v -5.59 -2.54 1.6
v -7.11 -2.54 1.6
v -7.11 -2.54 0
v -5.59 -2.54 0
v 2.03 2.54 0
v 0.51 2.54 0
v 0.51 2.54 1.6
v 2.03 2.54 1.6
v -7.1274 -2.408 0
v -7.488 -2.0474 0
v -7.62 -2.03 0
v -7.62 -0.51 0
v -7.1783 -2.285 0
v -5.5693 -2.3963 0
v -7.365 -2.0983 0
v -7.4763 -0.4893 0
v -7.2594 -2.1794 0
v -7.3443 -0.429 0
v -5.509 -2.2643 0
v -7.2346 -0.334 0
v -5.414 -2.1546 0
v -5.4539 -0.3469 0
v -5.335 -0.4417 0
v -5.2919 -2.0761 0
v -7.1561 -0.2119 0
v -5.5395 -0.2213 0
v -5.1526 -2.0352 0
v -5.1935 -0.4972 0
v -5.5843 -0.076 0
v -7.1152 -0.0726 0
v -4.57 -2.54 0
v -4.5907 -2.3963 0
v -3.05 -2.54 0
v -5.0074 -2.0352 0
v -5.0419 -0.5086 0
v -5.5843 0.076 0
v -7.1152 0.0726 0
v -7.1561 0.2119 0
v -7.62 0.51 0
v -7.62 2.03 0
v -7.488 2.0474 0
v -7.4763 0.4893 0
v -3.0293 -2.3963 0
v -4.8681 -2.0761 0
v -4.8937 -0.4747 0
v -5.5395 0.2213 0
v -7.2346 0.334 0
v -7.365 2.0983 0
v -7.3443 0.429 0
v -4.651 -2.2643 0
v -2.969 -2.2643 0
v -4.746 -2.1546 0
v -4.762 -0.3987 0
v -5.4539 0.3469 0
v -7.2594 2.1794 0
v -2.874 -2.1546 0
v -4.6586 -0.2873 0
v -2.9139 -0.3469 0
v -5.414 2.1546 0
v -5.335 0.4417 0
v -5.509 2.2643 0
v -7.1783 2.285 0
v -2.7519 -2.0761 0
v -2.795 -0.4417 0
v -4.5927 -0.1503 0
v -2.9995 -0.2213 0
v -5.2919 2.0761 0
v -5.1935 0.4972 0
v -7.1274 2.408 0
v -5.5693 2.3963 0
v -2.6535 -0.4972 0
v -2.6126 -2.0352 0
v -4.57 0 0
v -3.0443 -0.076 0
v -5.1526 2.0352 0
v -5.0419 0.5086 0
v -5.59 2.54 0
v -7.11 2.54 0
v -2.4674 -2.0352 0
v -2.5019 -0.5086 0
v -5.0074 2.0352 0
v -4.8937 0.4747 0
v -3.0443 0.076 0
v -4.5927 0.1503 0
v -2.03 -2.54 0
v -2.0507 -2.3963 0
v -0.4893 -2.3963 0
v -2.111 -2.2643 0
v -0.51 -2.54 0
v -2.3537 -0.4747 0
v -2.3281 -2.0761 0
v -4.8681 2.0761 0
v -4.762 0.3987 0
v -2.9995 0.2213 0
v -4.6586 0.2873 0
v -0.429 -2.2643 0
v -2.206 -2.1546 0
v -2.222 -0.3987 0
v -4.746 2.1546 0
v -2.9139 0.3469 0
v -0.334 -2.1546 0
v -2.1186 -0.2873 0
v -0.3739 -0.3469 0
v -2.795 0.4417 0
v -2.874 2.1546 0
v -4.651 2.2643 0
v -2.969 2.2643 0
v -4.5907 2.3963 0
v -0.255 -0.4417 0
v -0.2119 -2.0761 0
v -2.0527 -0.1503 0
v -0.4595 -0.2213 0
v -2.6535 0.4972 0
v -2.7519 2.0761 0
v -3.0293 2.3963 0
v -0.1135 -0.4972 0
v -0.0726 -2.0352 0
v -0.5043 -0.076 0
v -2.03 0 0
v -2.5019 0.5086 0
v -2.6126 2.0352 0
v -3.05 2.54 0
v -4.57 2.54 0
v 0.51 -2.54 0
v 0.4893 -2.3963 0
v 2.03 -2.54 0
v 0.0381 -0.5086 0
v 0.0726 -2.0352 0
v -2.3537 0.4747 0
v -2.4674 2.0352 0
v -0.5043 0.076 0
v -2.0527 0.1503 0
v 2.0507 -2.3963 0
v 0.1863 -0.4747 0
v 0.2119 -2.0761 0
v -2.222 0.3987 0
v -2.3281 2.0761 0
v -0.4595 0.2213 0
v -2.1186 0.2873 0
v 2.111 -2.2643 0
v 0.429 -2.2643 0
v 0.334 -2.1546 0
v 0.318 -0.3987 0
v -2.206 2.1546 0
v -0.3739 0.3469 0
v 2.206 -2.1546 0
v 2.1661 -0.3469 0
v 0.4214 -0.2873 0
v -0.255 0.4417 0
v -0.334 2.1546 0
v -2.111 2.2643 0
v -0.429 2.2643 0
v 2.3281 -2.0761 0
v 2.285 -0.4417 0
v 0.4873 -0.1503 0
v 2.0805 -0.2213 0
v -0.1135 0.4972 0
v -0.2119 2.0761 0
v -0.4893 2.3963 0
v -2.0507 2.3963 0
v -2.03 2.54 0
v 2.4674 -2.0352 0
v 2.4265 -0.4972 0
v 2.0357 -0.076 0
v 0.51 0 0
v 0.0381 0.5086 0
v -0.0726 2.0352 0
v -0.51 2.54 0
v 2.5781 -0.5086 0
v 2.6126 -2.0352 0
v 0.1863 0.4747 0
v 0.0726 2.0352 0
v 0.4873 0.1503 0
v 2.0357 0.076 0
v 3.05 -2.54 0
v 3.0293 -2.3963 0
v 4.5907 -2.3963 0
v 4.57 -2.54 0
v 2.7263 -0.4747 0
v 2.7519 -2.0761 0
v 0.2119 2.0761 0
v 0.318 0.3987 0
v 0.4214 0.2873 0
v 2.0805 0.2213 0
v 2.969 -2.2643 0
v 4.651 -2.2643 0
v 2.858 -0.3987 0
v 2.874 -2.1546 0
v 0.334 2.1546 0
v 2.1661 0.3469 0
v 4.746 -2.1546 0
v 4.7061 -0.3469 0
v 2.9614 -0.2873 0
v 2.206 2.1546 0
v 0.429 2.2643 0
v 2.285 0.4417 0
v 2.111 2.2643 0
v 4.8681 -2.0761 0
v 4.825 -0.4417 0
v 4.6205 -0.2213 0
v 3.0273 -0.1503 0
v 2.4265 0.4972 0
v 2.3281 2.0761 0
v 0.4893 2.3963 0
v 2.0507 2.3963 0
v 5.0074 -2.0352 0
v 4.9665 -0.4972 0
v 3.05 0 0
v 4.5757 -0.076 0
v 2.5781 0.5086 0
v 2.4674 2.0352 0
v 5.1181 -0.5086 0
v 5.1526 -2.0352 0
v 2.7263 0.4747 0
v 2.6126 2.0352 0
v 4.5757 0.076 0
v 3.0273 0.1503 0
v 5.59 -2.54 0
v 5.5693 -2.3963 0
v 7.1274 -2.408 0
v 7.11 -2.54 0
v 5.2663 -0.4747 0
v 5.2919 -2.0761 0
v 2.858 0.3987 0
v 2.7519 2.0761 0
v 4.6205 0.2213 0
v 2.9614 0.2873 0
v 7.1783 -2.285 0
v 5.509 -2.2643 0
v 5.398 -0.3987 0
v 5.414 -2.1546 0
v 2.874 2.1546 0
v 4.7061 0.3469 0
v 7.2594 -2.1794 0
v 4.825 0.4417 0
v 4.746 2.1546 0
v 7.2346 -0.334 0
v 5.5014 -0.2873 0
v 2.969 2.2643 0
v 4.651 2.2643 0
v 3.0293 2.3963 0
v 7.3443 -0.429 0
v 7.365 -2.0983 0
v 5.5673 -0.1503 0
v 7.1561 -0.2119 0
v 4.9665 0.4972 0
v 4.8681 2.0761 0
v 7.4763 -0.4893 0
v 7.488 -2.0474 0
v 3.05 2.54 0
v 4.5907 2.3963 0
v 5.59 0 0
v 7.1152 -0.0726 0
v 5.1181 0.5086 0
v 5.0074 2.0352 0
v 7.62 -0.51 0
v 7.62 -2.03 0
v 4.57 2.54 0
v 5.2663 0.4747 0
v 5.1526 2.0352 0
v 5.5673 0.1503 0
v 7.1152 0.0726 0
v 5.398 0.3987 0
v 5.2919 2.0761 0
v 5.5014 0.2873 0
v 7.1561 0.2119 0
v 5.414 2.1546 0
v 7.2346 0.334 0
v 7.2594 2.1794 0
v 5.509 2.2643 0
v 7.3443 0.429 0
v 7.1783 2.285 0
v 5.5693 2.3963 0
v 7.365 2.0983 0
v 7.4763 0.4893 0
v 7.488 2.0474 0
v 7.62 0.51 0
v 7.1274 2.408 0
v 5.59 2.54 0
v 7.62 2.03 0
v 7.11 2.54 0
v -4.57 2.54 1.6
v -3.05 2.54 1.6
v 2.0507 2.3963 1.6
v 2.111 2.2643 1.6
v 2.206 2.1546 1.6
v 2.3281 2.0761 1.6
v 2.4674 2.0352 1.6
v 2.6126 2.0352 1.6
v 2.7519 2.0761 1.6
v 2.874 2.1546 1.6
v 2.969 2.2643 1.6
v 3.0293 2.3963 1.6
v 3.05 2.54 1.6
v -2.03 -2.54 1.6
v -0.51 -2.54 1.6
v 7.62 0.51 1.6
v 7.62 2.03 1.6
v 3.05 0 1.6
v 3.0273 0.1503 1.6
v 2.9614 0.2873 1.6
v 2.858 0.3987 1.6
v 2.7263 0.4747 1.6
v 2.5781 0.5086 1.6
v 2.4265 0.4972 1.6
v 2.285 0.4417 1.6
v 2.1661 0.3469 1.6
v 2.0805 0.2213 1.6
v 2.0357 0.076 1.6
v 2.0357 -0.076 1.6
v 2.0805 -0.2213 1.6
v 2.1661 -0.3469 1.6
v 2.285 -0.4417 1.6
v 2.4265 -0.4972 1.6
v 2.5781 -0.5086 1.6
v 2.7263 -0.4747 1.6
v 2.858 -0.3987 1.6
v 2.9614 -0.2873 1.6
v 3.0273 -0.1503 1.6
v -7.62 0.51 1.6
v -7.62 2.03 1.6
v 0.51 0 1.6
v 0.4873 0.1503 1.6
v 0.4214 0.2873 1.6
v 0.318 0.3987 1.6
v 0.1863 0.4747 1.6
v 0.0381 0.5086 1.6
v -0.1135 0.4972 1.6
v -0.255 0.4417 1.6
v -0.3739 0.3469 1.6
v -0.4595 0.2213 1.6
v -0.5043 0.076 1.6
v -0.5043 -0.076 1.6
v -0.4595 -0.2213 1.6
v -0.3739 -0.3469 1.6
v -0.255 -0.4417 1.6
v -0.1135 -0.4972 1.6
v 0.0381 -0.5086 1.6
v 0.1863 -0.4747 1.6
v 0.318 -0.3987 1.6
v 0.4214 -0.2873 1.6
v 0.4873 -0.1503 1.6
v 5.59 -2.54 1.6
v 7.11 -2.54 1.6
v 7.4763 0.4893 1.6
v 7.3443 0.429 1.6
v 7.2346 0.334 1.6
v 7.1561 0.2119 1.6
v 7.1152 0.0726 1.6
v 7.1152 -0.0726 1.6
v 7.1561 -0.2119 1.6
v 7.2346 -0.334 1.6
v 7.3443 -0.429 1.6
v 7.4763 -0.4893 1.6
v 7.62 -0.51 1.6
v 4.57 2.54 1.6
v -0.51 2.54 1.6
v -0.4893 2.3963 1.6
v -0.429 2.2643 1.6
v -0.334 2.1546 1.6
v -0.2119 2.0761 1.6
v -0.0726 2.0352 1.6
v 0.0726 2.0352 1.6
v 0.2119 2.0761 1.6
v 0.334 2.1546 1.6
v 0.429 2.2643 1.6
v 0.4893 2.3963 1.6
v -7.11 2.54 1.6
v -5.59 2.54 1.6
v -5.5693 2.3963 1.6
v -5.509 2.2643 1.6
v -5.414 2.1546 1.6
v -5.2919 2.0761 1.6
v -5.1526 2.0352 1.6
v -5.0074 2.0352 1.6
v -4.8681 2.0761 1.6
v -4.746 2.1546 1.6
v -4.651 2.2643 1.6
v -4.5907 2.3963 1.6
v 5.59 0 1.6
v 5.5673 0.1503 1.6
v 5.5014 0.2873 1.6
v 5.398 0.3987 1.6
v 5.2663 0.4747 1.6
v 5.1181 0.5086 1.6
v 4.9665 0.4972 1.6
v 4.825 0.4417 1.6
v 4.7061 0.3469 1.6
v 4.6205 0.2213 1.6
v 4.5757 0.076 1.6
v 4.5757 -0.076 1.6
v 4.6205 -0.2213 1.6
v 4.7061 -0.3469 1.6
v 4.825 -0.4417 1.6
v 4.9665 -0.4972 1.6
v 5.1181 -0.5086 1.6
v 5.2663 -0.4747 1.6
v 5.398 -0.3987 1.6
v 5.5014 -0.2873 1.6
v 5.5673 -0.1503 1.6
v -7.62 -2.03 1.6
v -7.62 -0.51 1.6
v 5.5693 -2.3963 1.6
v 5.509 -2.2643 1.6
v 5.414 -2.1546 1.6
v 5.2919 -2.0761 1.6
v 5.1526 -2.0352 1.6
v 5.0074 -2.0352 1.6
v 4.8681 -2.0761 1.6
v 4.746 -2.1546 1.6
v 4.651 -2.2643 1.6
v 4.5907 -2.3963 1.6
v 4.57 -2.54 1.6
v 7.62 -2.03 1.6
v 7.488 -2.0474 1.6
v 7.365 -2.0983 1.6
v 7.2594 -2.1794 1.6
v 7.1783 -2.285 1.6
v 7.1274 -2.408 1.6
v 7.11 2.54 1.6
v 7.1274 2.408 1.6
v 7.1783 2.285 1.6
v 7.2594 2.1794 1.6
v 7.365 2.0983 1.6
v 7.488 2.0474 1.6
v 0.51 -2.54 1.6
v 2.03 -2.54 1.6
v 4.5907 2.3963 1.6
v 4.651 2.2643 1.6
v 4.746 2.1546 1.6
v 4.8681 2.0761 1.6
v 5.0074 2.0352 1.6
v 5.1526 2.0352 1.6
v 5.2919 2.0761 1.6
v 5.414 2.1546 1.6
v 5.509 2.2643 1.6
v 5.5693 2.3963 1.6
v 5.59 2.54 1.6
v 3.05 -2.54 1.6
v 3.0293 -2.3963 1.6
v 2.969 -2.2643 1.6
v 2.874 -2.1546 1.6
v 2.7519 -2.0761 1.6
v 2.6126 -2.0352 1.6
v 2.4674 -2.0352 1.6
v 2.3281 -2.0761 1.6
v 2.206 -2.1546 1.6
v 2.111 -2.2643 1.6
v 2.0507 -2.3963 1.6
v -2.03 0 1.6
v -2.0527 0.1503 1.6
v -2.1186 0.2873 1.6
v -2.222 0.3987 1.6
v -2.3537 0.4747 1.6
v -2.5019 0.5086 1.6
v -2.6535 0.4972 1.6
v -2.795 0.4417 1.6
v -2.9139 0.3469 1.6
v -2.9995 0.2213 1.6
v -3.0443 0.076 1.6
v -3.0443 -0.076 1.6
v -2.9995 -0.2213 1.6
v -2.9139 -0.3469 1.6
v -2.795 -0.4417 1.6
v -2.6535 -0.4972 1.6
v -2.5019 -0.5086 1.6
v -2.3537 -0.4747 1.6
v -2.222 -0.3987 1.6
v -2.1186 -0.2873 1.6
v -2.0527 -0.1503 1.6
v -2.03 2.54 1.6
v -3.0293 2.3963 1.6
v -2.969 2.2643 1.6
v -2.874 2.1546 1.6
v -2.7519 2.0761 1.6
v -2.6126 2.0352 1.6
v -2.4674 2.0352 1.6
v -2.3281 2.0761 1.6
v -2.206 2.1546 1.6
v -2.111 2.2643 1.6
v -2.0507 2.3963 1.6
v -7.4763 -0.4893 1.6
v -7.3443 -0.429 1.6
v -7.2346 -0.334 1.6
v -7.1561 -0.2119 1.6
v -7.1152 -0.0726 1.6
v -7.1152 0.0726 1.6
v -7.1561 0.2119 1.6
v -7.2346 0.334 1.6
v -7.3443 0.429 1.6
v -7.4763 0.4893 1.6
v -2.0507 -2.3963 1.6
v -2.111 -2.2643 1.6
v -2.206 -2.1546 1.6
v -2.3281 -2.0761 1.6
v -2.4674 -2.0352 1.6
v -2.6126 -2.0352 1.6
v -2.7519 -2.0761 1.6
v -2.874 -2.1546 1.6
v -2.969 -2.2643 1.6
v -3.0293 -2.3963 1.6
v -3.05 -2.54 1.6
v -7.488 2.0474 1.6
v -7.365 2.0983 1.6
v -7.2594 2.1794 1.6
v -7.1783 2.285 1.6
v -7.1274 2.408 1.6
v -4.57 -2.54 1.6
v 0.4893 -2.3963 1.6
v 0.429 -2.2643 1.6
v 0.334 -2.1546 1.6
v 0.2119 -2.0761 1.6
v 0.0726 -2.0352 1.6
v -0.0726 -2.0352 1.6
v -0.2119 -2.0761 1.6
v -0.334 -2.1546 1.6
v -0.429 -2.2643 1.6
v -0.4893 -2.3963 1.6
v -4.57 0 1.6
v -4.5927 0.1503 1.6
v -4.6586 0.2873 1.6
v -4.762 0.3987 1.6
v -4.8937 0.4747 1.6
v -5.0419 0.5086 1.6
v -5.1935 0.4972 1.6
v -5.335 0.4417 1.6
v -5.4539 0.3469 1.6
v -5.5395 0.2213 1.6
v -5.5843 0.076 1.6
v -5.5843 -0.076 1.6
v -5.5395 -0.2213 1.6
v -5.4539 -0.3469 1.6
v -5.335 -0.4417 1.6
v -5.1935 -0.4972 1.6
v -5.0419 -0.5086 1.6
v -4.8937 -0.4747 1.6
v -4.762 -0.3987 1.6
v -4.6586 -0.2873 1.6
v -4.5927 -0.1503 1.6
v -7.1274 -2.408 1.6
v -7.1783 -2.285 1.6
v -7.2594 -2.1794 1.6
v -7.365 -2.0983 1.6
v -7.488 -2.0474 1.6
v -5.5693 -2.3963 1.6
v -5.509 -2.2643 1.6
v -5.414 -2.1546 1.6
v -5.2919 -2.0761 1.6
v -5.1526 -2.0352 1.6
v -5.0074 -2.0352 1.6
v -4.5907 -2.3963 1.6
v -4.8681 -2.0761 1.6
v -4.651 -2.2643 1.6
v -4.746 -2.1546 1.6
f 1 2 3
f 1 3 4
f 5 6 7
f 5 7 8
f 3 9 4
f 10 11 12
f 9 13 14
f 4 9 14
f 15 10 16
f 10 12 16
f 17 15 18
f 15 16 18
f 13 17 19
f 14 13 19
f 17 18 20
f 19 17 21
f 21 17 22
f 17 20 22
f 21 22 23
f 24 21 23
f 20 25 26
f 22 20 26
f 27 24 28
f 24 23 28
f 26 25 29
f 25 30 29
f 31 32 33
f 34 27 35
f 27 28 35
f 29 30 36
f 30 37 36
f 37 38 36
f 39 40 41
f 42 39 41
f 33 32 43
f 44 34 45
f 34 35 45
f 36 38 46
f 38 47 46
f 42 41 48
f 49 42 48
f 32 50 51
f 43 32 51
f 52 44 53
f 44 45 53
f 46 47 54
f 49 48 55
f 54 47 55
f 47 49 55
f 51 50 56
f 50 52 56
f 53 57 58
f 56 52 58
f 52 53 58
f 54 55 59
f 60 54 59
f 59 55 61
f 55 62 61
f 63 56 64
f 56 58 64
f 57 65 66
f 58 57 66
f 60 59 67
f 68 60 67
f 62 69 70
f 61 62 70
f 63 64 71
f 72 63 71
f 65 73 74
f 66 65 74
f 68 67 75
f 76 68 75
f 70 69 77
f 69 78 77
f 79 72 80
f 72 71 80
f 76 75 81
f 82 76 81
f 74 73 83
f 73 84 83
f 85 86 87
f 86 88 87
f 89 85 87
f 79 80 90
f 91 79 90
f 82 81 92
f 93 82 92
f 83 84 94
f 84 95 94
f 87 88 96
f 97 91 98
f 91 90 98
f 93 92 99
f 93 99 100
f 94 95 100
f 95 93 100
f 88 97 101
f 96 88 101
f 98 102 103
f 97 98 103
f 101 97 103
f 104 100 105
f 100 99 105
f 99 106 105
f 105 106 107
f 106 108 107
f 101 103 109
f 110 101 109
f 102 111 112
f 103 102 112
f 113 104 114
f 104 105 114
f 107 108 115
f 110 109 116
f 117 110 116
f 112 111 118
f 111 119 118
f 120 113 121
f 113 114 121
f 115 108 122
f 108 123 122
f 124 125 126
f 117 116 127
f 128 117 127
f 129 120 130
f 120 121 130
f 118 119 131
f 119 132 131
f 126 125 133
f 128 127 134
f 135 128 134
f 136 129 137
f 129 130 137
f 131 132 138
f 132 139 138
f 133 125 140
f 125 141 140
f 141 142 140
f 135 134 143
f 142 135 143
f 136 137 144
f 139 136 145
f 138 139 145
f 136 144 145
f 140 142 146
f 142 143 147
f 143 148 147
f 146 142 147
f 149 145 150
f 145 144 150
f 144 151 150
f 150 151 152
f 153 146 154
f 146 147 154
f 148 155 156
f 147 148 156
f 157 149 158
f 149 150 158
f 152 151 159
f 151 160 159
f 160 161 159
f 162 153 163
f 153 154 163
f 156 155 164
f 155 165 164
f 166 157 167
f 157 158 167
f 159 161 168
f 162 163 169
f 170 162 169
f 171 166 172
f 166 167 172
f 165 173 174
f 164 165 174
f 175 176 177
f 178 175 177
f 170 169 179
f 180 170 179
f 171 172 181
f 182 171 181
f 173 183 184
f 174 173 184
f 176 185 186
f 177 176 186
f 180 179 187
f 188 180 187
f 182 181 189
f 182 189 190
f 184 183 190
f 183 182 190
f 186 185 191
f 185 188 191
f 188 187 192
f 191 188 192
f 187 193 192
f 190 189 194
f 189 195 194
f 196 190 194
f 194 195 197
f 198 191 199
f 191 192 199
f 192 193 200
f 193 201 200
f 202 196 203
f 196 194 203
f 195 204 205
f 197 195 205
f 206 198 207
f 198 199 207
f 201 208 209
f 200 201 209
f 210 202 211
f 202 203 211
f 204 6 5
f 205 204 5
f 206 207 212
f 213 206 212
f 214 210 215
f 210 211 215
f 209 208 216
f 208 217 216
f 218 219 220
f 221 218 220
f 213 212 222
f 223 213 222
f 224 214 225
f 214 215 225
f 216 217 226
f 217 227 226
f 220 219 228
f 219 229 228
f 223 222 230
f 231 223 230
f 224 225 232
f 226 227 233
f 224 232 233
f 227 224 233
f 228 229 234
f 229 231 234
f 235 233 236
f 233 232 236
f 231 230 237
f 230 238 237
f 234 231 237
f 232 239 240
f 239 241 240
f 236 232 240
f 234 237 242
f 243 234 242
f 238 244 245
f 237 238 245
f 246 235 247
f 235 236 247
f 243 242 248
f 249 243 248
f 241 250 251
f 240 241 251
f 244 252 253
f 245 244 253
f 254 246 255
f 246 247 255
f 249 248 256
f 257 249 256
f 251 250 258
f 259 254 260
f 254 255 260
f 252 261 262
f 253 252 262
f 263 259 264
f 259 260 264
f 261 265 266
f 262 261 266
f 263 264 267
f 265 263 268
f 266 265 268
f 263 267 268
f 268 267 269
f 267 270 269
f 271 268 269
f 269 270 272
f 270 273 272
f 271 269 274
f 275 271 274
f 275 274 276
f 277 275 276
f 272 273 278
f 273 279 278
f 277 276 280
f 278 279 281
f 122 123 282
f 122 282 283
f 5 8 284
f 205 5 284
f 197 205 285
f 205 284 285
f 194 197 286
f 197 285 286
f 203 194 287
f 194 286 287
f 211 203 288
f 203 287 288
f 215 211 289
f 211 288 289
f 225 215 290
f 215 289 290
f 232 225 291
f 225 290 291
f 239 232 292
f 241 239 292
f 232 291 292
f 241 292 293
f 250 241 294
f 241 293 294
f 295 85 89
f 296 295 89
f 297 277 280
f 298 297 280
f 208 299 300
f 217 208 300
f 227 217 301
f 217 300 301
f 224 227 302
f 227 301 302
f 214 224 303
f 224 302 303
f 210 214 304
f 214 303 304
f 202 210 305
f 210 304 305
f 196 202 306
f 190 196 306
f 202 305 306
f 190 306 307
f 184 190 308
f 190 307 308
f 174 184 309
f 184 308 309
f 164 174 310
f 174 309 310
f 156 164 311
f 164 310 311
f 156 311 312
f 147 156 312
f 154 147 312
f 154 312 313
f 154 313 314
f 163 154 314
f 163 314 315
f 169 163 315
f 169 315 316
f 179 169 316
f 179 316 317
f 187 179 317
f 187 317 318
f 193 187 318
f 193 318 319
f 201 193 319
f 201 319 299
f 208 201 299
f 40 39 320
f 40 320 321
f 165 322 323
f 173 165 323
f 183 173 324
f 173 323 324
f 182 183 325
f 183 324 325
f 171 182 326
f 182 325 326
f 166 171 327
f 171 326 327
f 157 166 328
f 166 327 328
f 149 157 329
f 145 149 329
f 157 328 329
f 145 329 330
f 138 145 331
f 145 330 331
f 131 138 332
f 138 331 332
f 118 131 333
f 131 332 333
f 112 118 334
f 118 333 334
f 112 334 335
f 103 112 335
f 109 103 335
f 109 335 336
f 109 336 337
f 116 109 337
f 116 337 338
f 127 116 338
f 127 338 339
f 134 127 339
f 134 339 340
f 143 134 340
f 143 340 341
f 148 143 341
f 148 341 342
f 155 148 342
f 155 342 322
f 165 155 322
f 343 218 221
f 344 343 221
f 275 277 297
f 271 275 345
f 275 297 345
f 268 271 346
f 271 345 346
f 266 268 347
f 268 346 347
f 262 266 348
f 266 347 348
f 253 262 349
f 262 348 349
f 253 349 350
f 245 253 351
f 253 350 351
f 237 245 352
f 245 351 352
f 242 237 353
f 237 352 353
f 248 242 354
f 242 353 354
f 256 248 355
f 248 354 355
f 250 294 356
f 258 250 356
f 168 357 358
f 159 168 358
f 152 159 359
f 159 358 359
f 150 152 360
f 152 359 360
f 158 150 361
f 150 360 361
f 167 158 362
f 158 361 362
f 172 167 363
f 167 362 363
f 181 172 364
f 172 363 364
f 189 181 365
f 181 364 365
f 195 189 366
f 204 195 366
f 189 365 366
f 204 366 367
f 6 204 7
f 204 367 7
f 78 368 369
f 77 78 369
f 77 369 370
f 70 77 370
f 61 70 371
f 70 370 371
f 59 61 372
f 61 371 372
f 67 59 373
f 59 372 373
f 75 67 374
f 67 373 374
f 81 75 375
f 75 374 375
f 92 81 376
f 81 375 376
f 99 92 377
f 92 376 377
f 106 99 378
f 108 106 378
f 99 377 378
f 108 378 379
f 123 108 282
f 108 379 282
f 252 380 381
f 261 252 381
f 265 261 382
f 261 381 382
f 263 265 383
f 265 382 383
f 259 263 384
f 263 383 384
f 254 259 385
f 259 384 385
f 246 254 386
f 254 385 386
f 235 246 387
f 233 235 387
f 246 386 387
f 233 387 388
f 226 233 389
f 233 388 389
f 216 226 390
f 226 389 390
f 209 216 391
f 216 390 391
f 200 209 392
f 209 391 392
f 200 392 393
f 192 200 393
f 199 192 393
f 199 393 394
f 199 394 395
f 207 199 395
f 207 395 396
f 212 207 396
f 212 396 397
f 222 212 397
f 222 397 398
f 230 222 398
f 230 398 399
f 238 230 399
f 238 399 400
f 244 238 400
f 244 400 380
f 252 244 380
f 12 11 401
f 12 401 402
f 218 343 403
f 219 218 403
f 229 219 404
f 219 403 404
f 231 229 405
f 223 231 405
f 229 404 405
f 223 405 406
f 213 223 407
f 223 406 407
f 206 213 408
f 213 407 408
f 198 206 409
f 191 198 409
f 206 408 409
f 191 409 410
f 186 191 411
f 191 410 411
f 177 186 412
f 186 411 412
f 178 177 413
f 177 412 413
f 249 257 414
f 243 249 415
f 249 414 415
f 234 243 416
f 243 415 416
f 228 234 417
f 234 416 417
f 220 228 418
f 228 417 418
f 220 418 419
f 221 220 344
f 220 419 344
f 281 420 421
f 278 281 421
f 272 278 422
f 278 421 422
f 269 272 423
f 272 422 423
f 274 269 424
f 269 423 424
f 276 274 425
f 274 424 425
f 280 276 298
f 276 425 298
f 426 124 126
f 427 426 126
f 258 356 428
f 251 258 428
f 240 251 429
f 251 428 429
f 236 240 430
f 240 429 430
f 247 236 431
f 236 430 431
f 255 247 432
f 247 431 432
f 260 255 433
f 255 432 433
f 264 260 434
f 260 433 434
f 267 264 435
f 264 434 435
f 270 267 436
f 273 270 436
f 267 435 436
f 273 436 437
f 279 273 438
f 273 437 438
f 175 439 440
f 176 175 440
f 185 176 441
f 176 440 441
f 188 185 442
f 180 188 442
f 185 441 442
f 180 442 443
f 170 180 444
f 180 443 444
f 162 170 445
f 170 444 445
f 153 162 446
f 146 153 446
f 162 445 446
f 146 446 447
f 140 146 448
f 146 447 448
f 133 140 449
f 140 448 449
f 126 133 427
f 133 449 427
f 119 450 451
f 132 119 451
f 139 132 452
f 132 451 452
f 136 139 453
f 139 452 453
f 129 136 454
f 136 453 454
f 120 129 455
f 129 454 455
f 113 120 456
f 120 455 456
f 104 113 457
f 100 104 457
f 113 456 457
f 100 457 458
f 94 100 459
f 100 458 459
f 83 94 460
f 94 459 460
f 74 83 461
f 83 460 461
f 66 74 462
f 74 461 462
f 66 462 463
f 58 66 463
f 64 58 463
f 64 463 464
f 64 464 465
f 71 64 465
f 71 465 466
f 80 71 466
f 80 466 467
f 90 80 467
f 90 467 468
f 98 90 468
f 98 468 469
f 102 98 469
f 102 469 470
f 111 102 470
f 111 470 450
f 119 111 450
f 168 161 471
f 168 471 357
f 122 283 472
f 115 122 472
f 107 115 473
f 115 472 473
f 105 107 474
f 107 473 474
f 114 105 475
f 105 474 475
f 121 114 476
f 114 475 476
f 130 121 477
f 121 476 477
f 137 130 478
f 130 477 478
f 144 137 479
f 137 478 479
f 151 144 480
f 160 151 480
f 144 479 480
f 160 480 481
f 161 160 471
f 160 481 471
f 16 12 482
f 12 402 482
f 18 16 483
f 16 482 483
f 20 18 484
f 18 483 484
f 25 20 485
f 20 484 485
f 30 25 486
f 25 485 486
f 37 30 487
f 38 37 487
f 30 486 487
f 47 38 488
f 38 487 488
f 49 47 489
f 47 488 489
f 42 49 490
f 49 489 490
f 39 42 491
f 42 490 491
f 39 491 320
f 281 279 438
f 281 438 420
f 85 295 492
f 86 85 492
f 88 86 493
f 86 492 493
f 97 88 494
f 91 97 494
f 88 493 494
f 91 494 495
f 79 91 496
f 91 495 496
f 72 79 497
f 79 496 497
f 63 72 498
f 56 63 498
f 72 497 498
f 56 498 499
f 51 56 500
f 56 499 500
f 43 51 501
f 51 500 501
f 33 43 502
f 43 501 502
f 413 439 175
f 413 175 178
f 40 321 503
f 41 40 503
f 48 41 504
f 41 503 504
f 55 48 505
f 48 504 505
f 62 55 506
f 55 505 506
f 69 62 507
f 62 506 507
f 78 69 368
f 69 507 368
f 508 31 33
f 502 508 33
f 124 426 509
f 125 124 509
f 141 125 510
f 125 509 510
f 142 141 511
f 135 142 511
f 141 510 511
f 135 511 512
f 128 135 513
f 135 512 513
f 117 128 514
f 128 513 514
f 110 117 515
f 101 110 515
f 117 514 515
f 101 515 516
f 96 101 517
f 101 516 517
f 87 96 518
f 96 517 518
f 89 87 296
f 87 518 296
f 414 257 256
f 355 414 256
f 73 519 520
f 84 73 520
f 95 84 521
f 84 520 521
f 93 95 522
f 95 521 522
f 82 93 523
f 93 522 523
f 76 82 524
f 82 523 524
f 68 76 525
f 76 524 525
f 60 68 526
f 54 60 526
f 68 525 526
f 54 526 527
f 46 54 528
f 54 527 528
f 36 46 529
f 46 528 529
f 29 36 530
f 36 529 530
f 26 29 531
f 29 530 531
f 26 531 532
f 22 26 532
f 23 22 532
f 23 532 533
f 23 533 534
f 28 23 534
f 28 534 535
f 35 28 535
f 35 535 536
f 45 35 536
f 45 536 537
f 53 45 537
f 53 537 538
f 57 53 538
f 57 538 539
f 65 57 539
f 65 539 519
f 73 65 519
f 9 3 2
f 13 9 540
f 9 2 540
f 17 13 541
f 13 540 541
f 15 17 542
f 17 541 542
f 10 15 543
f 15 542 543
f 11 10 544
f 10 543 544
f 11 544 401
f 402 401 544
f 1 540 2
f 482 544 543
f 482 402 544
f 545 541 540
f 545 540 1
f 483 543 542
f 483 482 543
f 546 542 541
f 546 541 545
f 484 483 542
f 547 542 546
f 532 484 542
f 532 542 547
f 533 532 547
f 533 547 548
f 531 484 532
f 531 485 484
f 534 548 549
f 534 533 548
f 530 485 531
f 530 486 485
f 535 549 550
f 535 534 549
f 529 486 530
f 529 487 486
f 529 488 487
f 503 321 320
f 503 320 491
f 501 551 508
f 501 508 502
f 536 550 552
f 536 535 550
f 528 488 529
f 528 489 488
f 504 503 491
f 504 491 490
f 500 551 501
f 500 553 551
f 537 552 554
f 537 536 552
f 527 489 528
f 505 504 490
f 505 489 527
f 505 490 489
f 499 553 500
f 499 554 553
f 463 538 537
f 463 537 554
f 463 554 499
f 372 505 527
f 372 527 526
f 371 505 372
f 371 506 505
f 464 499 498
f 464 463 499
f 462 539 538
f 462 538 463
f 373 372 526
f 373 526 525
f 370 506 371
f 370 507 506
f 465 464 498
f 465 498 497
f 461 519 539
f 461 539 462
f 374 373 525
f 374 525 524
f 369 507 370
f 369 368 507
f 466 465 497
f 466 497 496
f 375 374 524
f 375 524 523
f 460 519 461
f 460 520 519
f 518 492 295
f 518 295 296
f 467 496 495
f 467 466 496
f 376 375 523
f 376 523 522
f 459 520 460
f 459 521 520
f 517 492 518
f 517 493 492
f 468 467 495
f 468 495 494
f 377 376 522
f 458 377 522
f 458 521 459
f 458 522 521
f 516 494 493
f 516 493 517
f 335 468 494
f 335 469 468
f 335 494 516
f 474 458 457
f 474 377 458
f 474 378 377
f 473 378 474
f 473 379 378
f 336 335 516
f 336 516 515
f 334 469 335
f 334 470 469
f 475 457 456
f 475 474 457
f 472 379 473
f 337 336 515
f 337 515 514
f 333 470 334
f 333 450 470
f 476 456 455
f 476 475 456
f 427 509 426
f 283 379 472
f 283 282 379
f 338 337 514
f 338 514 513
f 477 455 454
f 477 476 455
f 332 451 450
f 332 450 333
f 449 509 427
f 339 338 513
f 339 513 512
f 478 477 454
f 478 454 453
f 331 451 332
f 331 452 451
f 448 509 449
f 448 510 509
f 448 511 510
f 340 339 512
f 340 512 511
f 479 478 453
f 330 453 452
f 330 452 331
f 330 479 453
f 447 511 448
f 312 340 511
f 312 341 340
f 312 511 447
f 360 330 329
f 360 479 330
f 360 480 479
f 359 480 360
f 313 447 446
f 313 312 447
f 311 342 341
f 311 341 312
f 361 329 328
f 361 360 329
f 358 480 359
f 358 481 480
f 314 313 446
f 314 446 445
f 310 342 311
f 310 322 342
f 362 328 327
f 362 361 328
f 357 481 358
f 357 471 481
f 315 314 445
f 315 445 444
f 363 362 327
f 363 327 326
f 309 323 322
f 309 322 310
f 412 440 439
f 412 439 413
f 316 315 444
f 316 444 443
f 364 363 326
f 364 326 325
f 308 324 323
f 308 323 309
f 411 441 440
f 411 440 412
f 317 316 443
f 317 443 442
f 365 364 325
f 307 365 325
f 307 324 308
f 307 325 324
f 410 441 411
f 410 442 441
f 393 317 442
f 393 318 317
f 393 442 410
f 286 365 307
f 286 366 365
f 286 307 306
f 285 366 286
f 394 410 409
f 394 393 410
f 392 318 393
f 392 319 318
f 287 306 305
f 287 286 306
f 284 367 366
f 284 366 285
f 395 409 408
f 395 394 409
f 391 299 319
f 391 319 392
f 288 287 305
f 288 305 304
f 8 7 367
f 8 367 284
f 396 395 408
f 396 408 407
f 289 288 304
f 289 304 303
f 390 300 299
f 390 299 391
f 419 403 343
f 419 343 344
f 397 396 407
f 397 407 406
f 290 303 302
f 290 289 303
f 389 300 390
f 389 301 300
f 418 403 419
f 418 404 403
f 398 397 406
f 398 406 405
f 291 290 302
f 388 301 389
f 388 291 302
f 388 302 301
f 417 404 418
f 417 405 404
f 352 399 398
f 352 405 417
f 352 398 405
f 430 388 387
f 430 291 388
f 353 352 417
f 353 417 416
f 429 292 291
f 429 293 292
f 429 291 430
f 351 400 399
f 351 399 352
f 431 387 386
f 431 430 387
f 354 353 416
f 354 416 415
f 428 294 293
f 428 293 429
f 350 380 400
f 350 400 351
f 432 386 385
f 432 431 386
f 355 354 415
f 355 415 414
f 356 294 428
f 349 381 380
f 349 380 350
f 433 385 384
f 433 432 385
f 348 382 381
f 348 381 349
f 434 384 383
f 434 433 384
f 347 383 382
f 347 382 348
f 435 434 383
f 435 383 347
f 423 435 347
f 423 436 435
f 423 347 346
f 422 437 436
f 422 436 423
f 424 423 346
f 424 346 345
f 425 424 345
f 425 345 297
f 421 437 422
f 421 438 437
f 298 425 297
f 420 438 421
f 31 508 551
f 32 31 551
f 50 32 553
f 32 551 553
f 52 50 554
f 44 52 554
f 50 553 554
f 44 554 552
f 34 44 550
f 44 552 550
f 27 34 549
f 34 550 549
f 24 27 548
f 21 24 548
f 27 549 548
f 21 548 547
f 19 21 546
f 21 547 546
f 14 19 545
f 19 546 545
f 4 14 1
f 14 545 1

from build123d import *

# Parameters (mm, degrees)
SKETCH_W                     = 15.24
SKETCH_H                     = 5.08
PAD_DEPTH                    = 1.6
SKETCH001_R                  = 0.51
POCKET_DEPTH                 = 33.888707
SKETCH001_LINEARPATTERN_2_R  = 0.51
POCKET_LINEARPATTERN_2_DEPTH = 33.888707
SKETCH001_LINEARPATTERN_3_R  = 0.51
POCKET_LINEARPATTERN_3_DEPTH = 33.888707
SKETCH001_LINEARPATTERN_4_R  = 0.51
POCKET_LINEARPATTERN_4_DEPTH = 33.888707
SKETCH001_LINEARPATTERN_5_R  = 0.51
POCKET_LINEARPATTERN_5_DEPTH = 33.888707
SKETCH001_LINEARPATTERN_6_R  = 0.51
POCKET_LINEARPATTERN_6_DEPTH = 33.888707
SKETCH001_LINEARPATTERN_7_R  = 0.51
POCKET_LINEARPATTERN_7_DEPTH = 33.888707
LINEARPATTERN003_COUNT       = 3
LINEARPATTERN003_PITCH       = 2.54


with BuildPart() as part:
    # Sketch → Pad (new body)
    with BuildSketch(Plane.XY):
        Rectangle(SKETCH_W, SKETCH_H)
    extrude(amount=PAD_DEPTH)

    # Sketch001 → Pocket (cut, through all)
    with BuildSketch(Plane.XY.offset(1.6)):
        with Locations((-7.62, 2.54)):
            Circle(SKETCH001_R)
    pocket = extrude(amount=-POCKET_DEPTH, mode=Mode.SUBTRACT)

    # Sketch001 LinearPattern 2 → Pocket LinearPattern 2 (cut, through all)
    with BuildSketch(Plane(origin=(2.54, 0, 1.6), x_dir=(1, 0, 0), z_dir=(0, 0, 1))):
        with Locations((-7.62, 2.54)):
            Circle(SKETCH001_LINEARPATTERN_2_R)
    pocket_linearpattern_2 = extrude(amount=-POCKET_LINEARPATTERN_2_DEPTH, mode=Mode.SUBTRACT)

    # Sketch001 LinearPattern 3 → Pocket LinearPattern 3 (cut, through all)
    with BuildSketch(Plane(origin=(5.08, 0, 1.6), x_dir=(1, 0, 0), z_dir=(0, 0, 1))):
        with Locations((-7.62, 2.54)):
            Circle(SKETCH001_LINEARPATTERN_3_R)
    pocket_linearpattern_3 = extrude(amount=-POCKET_LINEARPATTERN_3_DEPTH, mode=Mode.SUBTRACT)

    # Sketch001 LinearPattern 4 → Pocket LinearPattern 4 (cut, through all)
    with BuildSketch(Plane(origin=(7.62, 0, 1.6), x_dir=(1, 0, 0), z_dir=(0, 0, 1))):
        with Locations((-7.62, 2.54)):
            Circle(SKETCH001_LINEARPATTERN_4_R)
    pocket_linearpattern_4 = extrude(amount=-POCKET_LINEARPATTERN_4_DEPTH, mode=Mode.SUBTRACT)

    # Sketch001 LinearPattern 5 → Pocket LinearPattern 5 (cut, through all)
    with BuildSketch(Plane(origin=(10.16, 0, 1.6), x_dir=(1, 0, 0), z_dir=(0, 0, 1))):
        with Locations((-7.62, 2.54)):
            Circle(SKETCH001_LINEARPATTERN_5_R)
    pocket_linearpattern_5 = extrude(amount=-POCKET_LINEARPATTERN_5_DEPTH, mode=Mode.SUBTRACT)

    # Sketch001 LinearPattern 6 → Pocket LinearPattern 6 (cut, through all)
    with BuildSketch(Plane(origin=(12.7, 0, 1.6), x_dir=(1, 0, 0), z_dir=(0, 0, 1))):
        with Locations((-7.62, 2.54)):
            Circle(SKETCH001_LINEARPATTERN_6_R)
    pocket_linearpattern_6 = extrude(amount=-POCKET_LINEARPATTERN_6_DEPTH, mode=Mode.SUBTRACT)

    # Sketch001 LinearPattern 7 → Pocket LinearPattern 7 (cut, through all)
    with BuildSketch(Plane(origin=(15.24, 0, 1.6), x_dir=(1, 0, 0), z_dir=(0, 0, 1))):
        with Locations((-7.62, 2.54)):
            Circle(SKETCH001_LINEARPATTERN_7_R)
    pocket_linearpattern_7 = extrude(amount=-POCKET_LINEARPATTERN_7_DEPTH, mode=Mode.SUBTRACT)

    # LinearPattern003: Pocket, Pocket LinearPattern 2, Pocket LinearPattern 3, Pocket LinearPattern 4, Pocket LinearPattern 5, Pocket LinearPattern 6, Pocket LinearPattern 7 ×3
    with Locations(*[(0, -i * LINEARPATTERN003_PITCH, 0) for i in range(1, LINEARPATTERN003_COUNT)]):
        add(pocket, mode=Mode.SUBTRACT)
        add(pocket_linearpattern_2, mode=Mode.SUBTRACT)
        add(pocket_linearpattern_3, mode=Mode.SUBTRACT)
        add(pocket_linearpattern_4, mode=Mode.SUBTRACT)
        add(pocket_linearpattern_5, mode=Mode.SUBTRACT)
        add(pocket_linearpattern_6, mode=Mode.SUBTRACT)
        add(pocket_linearpattern_7, mode=Mode.SUBTRACT)


solid = part.part
